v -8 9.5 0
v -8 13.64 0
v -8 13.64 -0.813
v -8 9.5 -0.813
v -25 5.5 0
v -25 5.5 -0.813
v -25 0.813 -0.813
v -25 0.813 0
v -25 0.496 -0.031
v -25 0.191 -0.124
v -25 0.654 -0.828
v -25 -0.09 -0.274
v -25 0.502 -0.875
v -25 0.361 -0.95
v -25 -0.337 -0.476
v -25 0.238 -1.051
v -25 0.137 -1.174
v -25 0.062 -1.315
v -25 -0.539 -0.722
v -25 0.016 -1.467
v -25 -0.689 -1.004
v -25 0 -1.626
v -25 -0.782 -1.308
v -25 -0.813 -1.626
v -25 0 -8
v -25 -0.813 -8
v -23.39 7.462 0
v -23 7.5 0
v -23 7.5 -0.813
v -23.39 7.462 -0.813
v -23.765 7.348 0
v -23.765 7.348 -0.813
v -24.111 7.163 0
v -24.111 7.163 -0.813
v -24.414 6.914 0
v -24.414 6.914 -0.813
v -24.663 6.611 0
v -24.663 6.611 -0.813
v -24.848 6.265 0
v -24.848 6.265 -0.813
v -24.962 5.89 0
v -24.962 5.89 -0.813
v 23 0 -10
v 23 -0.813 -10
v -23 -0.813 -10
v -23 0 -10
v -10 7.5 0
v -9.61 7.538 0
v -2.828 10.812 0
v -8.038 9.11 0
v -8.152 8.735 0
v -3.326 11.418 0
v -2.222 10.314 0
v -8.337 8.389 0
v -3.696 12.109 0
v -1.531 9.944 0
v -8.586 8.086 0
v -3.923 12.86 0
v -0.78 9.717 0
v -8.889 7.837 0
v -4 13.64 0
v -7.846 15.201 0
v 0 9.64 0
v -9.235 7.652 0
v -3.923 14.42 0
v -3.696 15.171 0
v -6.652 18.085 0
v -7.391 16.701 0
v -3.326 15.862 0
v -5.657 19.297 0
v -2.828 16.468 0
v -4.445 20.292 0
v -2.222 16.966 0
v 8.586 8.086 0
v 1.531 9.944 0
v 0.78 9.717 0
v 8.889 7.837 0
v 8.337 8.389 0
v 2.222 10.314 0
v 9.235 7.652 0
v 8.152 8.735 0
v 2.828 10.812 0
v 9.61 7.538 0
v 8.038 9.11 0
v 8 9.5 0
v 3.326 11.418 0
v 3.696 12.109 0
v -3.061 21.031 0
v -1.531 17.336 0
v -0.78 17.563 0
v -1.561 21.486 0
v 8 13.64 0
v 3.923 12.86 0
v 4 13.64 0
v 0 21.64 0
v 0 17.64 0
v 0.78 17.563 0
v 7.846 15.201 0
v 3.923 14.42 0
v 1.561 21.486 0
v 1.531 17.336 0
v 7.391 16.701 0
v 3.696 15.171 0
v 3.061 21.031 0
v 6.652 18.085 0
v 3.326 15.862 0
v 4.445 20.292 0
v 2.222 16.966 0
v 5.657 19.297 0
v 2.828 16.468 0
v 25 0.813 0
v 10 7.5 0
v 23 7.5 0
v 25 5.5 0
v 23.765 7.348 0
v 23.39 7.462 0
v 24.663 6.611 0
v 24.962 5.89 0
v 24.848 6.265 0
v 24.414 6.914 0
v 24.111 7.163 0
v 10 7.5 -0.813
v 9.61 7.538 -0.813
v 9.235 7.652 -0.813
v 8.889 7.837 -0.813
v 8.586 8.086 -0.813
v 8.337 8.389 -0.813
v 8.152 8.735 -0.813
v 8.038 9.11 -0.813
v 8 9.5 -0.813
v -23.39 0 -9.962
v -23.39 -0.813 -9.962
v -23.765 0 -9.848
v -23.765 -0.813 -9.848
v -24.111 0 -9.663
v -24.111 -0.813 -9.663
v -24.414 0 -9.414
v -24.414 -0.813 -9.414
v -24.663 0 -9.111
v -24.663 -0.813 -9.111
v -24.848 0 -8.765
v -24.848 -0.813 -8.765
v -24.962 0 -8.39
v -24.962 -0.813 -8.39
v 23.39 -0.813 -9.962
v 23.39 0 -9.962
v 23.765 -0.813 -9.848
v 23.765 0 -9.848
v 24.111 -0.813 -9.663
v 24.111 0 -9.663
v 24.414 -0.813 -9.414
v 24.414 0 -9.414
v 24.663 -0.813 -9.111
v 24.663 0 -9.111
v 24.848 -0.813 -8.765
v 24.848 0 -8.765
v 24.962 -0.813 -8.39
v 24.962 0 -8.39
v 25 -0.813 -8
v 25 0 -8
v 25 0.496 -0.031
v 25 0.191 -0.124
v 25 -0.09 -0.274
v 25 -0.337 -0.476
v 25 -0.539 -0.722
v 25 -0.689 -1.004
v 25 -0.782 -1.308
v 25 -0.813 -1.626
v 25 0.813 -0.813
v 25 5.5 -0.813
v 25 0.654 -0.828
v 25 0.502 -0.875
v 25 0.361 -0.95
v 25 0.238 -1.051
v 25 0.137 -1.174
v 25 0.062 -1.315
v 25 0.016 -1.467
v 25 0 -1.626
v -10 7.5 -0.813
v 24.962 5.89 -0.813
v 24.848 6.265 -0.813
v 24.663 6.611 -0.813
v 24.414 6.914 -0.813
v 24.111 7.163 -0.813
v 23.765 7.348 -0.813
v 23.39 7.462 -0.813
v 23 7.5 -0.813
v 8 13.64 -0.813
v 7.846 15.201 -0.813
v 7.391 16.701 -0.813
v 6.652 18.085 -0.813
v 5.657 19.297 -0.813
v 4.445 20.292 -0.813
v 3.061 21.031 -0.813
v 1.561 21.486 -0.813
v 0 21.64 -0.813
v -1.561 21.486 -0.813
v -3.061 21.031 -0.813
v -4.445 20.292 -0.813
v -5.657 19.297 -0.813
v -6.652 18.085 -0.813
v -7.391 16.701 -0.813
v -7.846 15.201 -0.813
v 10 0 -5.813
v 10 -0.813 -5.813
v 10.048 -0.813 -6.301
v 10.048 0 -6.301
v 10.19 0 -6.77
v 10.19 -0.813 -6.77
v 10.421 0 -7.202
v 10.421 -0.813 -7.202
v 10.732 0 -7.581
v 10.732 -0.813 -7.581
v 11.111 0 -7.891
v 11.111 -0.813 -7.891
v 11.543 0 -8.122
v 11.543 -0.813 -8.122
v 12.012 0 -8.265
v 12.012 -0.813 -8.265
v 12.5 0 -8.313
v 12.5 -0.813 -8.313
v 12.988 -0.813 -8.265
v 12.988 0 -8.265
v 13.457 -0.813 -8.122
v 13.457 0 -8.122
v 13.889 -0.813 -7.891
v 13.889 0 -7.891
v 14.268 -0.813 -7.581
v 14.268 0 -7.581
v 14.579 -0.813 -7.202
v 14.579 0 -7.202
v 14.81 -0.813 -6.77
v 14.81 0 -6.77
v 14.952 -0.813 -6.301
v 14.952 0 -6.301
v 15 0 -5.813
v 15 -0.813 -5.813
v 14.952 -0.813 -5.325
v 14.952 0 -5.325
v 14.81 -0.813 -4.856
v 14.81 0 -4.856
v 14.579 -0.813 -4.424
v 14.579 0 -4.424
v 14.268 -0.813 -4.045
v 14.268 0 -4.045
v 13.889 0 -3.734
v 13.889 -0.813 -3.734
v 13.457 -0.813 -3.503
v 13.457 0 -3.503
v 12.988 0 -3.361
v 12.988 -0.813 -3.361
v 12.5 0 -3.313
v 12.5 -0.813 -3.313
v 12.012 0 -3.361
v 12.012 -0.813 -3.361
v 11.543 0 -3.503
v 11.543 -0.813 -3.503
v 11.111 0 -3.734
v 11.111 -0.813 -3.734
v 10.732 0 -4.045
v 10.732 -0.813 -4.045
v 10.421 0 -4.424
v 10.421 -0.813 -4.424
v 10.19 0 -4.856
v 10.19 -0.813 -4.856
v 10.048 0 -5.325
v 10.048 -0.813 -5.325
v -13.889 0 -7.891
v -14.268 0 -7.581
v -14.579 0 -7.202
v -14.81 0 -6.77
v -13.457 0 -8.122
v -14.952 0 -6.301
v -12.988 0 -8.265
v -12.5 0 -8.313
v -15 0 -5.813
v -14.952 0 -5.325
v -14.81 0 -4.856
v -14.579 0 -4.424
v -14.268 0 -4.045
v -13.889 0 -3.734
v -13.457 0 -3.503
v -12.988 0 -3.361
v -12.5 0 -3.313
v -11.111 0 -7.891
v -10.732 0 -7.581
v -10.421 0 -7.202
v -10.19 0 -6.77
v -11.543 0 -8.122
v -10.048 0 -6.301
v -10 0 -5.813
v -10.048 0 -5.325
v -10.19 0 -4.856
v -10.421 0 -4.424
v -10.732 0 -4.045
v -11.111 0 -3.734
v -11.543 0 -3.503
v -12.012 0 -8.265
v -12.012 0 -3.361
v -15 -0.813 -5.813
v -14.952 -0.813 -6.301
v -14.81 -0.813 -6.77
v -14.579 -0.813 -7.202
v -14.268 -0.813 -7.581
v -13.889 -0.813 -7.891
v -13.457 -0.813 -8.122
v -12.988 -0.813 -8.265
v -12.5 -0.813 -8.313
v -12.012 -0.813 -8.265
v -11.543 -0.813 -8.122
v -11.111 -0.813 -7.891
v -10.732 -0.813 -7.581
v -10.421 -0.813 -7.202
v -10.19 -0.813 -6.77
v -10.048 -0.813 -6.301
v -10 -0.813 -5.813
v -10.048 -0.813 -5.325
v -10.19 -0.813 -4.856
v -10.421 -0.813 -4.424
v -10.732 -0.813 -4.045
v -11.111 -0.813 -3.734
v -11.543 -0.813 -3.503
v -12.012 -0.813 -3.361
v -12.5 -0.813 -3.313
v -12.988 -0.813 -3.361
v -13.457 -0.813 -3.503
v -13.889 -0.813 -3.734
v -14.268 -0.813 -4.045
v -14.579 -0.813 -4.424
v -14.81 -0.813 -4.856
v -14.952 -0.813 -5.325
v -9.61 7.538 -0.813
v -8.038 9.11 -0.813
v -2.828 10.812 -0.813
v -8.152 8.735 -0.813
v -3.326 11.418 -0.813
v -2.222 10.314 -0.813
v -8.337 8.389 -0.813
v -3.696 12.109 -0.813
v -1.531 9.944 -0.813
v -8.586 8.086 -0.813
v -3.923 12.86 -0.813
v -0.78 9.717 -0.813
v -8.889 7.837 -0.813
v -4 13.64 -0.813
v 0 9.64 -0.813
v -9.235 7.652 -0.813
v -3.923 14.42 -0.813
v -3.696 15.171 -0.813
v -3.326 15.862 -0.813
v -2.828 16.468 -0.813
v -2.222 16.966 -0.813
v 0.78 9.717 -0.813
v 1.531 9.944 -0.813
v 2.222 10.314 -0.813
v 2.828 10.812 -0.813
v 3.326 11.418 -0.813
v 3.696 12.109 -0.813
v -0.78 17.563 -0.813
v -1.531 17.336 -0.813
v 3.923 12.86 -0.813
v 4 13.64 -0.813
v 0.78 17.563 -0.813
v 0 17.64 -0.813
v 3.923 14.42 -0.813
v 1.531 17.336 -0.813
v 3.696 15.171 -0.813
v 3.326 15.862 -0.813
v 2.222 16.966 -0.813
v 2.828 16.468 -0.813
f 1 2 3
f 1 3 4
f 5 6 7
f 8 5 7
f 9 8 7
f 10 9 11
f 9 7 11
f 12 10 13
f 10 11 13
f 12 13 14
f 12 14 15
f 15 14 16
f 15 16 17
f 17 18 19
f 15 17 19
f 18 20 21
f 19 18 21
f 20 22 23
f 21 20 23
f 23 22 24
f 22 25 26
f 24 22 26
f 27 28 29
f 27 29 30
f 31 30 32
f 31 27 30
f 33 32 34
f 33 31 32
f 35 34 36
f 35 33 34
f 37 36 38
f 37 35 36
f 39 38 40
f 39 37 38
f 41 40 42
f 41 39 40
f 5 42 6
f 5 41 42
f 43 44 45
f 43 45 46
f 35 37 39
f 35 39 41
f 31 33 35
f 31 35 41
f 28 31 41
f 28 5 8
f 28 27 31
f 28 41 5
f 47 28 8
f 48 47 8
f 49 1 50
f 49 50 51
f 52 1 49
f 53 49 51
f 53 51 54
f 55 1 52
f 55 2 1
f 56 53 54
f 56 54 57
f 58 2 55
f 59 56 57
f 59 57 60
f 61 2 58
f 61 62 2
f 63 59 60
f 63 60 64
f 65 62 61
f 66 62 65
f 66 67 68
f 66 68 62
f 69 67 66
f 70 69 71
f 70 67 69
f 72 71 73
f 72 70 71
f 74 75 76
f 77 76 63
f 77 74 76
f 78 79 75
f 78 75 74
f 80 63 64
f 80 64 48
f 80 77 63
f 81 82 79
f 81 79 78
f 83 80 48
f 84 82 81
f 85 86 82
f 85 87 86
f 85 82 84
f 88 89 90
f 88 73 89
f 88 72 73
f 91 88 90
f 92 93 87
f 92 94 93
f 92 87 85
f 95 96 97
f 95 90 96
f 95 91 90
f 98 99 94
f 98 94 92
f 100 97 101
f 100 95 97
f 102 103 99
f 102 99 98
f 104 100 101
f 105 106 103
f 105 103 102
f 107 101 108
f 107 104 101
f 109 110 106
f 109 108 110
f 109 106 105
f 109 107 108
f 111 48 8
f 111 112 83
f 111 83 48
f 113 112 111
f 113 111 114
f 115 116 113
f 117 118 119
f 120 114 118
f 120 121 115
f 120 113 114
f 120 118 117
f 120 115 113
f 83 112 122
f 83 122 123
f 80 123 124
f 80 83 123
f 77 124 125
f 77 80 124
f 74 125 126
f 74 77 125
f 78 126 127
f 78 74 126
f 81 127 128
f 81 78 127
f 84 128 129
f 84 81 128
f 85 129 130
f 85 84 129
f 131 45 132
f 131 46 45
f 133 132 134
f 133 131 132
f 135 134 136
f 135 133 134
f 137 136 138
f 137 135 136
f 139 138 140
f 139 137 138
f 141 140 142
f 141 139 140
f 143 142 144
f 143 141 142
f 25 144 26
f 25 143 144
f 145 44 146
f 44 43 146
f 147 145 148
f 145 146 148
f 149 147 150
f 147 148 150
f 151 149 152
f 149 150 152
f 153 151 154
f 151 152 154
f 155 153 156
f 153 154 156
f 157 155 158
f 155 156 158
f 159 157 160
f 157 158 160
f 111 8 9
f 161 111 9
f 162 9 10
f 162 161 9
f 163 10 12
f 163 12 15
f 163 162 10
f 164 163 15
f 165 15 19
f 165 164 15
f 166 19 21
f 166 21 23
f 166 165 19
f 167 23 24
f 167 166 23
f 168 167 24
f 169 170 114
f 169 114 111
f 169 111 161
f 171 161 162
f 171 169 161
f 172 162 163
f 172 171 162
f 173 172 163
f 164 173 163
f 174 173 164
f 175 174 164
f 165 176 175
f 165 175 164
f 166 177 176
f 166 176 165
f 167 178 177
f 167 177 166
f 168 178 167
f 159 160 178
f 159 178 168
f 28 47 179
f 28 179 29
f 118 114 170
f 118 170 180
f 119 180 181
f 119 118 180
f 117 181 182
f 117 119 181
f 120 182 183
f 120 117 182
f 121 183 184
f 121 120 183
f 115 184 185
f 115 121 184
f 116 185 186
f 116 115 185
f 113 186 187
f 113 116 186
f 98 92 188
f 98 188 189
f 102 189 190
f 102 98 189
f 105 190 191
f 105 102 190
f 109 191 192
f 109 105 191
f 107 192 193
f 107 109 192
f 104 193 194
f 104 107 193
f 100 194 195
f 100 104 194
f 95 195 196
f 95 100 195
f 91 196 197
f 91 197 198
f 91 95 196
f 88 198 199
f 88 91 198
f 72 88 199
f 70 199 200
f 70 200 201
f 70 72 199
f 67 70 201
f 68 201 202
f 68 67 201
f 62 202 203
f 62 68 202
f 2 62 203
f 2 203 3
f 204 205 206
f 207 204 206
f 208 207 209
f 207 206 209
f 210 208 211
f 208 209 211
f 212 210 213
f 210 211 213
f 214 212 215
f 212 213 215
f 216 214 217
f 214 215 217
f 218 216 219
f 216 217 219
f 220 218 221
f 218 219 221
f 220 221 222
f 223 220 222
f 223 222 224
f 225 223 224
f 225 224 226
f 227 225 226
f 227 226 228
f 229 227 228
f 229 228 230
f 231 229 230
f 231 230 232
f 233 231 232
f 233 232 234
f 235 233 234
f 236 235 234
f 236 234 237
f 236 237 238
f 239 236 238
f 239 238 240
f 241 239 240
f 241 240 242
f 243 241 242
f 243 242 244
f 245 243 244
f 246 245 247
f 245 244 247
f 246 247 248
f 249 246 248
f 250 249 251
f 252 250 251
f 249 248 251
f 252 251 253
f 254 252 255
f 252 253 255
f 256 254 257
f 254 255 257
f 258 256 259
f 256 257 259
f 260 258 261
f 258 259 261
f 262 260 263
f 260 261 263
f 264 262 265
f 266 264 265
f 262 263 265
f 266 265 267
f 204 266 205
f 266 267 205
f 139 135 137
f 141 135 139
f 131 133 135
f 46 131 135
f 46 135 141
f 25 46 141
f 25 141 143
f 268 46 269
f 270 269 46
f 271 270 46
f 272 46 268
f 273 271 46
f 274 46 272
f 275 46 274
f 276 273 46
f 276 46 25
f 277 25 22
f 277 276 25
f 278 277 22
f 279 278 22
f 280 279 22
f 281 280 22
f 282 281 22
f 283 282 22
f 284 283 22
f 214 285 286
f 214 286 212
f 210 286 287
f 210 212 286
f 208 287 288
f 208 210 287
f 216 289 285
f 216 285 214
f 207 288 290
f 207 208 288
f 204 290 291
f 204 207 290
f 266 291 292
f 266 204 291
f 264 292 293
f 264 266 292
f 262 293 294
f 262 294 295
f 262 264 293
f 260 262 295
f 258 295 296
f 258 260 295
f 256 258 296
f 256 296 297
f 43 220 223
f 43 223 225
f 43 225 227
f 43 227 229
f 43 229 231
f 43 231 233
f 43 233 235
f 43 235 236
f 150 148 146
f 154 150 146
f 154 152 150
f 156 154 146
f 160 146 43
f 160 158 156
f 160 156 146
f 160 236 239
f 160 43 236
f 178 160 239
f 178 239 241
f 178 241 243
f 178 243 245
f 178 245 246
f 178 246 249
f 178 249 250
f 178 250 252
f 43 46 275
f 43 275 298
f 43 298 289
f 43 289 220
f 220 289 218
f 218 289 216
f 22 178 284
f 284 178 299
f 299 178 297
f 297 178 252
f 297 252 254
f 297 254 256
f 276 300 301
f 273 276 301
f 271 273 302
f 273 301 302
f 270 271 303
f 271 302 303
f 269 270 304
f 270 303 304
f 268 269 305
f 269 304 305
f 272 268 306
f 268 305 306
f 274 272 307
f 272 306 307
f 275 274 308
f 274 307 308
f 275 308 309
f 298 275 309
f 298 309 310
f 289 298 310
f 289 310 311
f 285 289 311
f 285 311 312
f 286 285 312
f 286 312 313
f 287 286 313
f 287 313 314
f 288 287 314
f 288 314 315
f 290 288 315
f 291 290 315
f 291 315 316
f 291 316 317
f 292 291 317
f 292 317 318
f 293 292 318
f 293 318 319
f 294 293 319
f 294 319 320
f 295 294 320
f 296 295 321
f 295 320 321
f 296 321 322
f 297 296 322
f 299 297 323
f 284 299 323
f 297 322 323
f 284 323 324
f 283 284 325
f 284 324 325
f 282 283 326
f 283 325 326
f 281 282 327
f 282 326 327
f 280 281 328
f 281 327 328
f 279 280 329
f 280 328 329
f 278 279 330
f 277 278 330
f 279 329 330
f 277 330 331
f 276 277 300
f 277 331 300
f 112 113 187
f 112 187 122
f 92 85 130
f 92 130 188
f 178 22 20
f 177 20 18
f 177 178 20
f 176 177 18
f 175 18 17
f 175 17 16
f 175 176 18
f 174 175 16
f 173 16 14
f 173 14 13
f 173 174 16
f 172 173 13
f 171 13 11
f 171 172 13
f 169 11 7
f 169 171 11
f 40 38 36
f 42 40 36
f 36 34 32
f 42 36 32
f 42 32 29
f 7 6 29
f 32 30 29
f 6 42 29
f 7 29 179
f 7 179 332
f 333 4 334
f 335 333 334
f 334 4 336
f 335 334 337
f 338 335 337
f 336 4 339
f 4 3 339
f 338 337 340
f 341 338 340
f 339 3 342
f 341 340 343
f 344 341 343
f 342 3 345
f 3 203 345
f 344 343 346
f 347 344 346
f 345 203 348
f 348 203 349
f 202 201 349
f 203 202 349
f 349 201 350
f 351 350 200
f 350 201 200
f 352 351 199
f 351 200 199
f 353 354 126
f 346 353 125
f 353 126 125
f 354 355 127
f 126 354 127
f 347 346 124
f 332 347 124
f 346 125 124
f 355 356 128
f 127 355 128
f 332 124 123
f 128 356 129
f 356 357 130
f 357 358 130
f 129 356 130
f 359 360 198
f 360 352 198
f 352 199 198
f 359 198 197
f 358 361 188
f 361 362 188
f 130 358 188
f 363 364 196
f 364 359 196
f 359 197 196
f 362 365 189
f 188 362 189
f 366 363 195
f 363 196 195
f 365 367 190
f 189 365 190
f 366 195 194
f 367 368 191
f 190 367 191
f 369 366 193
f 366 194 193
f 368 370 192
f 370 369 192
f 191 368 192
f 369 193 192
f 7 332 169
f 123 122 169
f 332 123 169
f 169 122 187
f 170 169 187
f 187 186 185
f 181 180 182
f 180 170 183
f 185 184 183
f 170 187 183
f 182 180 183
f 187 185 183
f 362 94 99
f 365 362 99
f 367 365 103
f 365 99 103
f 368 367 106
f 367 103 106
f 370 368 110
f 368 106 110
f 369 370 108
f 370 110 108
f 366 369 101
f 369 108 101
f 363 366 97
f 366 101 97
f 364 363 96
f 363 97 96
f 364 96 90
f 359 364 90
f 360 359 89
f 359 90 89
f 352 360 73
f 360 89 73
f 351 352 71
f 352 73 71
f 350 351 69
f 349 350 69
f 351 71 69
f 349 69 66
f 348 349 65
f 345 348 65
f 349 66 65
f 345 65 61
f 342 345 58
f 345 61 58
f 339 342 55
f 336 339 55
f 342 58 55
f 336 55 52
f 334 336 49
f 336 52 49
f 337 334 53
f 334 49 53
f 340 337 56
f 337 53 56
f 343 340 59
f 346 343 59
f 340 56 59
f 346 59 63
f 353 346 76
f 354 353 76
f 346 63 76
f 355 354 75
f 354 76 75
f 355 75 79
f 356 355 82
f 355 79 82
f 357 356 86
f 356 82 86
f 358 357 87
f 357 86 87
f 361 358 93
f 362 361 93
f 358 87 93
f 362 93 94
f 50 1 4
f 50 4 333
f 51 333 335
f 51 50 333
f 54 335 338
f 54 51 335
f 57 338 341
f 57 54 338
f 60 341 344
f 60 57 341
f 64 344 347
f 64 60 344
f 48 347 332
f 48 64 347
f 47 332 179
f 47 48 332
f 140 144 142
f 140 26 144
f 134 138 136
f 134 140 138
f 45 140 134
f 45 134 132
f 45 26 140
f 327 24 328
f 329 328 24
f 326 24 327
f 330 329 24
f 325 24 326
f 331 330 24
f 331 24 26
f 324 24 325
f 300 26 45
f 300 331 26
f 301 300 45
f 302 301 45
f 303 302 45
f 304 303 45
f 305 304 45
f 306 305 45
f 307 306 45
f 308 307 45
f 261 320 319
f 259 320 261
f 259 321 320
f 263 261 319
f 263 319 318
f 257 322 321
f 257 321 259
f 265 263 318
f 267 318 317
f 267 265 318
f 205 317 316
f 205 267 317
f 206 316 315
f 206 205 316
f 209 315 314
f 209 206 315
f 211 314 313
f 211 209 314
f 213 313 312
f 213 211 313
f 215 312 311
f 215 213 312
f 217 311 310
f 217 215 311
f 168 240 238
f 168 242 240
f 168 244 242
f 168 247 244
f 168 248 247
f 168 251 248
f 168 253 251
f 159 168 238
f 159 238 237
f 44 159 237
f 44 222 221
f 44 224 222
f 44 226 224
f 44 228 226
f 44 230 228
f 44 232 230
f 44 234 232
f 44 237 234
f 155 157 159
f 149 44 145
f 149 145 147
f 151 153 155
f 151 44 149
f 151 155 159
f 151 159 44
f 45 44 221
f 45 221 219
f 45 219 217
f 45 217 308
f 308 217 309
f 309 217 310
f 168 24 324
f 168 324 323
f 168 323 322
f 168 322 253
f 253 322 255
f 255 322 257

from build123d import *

# Parameters (mm, degrees)
SKETCH1_R                    = 4
BASE_FLANGE1_DEPTH           = 0.8128
EDGE_FLANGE1_STRIP_W         = 4.8768
EDGE_FLANGE1_STRIP_H         = 0.8128
EDGE_FLANGE1_STRIP_CUT_DEPTH = 50
EDGE_FLANGE1_DEPTH           = 50
FILLET2_R                    = 2
F_5_0MM_DOWEL_HOLE1_D        = 5


# Sheet-metal steps are written as plain solids
with BuildPart() as part:
    # Sketch1 → Base-Flange1 (new body)
    with BuildSketch(Plane.XY):
        with BuildLine():
            Line((-25, 0), (25, 0))
            Line((25, 0), (25, 5.5))
            ThreePointArc((25, 5.5), (24.414213562, 6.914213562), (23, 7.5))
            Line((23, 7.5), (10, 7.5))
            ThreePointArc((10, 7.5), (8.585786438, 8.085786438), (8, 9.5))
            Line((8, 9.5), (8, 13.64))
            ThreePointArc((8, 13.64), (0, 21.64), (-8, 13.64))
            Line((-8, 13.64), (-8, 9.5))
            ThreePointArc((-8, 9.5), (-8.585786438, 8.085786438), (-10, 7.5))
            Line((-10, 7.5), (-23, 7.5))
            ThreePointArc((-23, 7.5), (-24.414213562, 6.914213562), (-25, 5.5))
            Line((-25, 5.5), (-25, 0))
        make_face()
        with Locations((0, 13.64)):
            Circle(SKETCH1_R, mode=Mode.SUBTRACT)
    extrude(amount=-BASE_FLANGE1_DEPTH)

    # Edge-Flange1 strip (across the edge) → Edge-Flange1 strip cut (cut)
    with BuildSketch(Plane(origin=(25, 0, -0.8128), x_dir=(0, 1, 0), z_dir=(-1, 0, 0))):
        with Locations((-1.6256, -0.4064)):
            Rectangle(EDGE_FLANGE1_STRIP_W, EDGE_FLANGE1_STRIP_H)
    extrude(amount=EDGE_FLANGE1_STRIP_CUT_DEPTH, mode=Mode.SUBTRACT)

    # Edge-Flange1 section (across the edge) → Edge-Flange1 (add)
    with BuildSketch(Plane(origin=(25, 0, -0.8128), x_dir=(0, 1, 0), z_dir=(-1, 0, 0))):
        with BuildLine():
            Line((-0.8128, 0.8128), (-0.8128, 9.1872))
            Line((-0.8128, 9.1872), (0, 9.1872))
            Line((0, 9.1872), (0, 0.8128))
            ThreePointArc((0, 0.8128), (0.238063608, 0.238063608), (0.8128, 0))
            Line((0.8128, 0), (0.8128, -0.8128))
            ThreePointArc((0.8128, -0.8128), (-0.336672783, -0.336672783), (-0.8128, 0.8128))
        make_face()
    extrude(amount=EDGE_FLANGE1_DEPTH)

    # Fillet2
    fillet2_edges = [part.edges().sort_by_distance(p)[0] for p in [
        (25, -0.4064, -10),
        (-25, -0.4064, -10),
    ]]
    fillet(fillet2_edges, radius=FILLET2_R)

    # Ø5.0mm Dowel Hole1 (through all)
    with Locations(Plane(origin=(0, 0, 0), x_dir=(1, 0, 0), z_dir=(0, 1, 0))):
        with Locations((-12.5, 5.8128), (12.5, 5.8128)):
            Hole(F_5_0MM_DOWEL_HOLE1_D / 2)


solid = part.part
